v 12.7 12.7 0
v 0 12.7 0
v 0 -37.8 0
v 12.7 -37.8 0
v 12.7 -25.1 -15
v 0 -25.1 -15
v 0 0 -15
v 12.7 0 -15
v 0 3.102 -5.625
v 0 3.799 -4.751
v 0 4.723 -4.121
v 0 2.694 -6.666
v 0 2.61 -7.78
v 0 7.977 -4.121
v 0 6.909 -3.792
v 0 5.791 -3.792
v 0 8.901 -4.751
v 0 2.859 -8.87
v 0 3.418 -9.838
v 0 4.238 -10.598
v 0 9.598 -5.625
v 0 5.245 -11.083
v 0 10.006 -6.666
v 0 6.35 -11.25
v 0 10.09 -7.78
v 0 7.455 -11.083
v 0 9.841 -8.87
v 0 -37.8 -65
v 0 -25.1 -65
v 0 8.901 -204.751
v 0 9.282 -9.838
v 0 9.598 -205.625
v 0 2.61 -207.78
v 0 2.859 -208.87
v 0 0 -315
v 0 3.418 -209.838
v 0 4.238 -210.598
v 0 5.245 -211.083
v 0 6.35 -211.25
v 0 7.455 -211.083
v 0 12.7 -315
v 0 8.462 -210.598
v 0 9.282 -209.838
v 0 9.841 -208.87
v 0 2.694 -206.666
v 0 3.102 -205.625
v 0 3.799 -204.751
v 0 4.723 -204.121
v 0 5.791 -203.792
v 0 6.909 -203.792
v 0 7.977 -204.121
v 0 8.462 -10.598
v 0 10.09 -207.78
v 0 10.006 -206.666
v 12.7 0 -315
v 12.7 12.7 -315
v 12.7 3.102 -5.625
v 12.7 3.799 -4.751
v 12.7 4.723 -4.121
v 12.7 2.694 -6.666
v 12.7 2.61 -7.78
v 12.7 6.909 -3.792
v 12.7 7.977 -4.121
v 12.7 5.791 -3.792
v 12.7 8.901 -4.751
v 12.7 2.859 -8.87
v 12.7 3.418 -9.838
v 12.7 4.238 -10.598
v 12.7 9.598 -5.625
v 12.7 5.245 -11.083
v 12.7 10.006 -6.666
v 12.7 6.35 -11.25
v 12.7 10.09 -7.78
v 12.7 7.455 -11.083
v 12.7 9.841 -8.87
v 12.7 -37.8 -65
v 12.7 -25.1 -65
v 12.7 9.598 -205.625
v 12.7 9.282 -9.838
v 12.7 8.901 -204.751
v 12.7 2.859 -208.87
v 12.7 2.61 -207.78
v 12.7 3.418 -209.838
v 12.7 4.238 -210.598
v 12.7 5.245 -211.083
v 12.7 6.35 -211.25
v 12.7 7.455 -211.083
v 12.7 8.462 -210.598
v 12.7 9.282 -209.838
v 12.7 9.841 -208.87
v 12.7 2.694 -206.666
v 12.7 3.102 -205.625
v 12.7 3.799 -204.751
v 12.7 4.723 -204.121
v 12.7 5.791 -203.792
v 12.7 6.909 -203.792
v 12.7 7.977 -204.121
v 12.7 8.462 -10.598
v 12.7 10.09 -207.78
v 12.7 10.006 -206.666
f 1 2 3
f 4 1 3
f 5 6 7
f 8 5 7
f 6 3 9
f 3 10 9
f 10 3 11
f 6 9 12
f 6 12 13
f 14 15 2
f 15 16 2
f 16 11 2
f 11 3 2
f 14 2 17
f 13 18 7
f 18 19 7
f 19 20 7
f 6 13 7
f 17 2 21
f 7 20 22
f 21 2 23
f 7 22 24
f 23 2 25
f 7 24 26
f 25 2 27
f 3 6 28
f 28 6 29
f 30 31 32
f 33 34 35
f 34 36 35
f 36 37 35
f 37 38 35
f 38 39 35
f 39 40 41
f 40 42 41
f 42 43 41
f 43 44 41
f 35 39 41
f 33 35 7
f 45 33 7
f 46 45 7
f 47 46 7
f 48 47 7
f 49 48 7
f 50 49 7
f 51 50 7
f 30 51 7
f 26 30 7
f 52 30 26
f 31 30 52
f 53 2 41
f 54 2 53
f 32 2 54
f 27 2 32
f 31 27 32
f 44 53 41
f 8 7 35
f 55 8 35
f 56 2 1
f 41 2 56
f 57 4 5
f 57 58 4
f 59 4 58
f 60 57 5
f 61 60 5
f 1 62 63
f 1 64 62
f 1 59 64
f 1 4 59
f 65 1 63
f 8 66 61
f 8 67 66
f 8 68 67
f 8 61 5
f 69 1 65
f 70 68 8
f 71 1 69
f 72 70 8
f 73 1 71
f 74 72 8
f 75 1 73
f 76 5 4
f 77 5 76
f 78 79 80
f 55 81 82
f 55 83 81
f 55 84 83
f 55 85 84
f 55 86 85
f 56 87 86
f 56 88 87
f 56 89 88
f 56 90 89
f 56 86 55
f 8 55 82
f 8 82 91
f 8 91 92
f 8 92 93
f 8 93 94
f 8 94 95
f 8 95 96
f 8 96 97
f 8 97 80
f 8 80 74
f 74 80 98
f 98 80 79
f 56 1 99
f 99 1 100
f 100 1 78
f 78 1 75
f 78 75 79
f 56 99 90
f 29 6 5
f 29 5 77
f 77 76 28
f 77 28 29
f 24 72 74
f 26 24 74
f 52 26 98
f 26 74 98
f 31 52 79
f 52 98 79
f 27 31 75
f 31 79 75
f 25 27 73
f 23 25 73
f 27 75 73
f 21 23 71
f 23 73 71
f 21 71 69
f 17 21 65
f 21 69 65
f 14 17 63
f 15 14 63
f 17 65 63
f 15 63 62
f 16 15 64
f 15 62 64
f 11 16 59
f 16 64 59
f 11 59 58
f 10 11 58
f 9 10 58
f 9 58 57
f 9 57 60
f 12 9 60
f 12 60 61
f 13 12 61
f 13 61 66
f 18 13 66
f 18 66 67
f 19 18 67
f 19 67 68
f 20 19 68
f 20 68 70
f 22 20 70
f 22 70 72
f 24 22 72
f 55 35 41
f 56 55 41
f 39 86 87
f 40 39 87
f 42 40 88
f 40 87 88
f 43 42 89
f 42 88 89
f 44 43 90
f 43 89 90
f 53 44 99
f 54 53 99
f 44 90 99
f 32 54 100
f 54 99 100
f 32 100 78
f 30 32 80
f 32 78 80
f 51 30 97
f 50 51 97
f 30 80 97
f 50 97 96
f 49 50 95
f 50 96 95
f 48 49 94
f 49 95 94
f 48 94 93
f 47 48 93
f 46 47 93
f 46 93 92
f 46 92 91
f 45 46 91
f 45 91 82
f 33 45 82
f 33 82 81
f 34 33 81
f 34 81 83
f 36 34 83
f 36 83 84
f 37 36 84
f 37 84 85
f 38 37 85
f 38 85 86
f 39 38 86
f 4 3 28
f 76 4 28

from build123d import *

# Parameters (mm, degrees)
SKETCH1_W           = 315
SKETCH1_H           = 12.7
SKETCH1_W_2         = 50
BOSS_EXTRUDE1_DEPTH = 12.7
SKETCH2_R           = 3.75
CUT_EXTRUDE1_DEPTH  = 318.513983944


with BuildPart() as part:
    # Sketch1 → Boss-Extrude1 (new body)
    with BuildSketch(Plane(origin=(0, 0, 0), x_dir=(0, 0, -1), z_dir=(1, 0, 0))):
        with Locations((157.5, 6.35)):
            Rectangle(SKETCH1_W, SKETCH1_H)
        Polygon((15, 0), (0, 0), (0, -37.8), (15, -37.8), (15, -25.1), align=None)
        with Locations((40, -31.45)):
            Rectangle(SKETCH1_W_2, SKETCH1_H)
    extrude(amount=BOSS_EXTRUDE1_DEPTH)

    # Sketch2 → Cut-Extrude1 (cut, through all)
    with BuildSketch(Plane(origin=(12.7, 0, 0), x_dir=(0, 0, -1), z_dir=(1, 0, 0))):
        with Locations((7.5, 6.35)):
            Circle(SKETCH2_R)
        with Locations((207.5, 6.35)):
            Circle(SKETCH2_R)
    extrude(amount=-CUT_EXTRUDE1_DEPTH, mode=Mode.SUBTRACT)


solid = part.part
